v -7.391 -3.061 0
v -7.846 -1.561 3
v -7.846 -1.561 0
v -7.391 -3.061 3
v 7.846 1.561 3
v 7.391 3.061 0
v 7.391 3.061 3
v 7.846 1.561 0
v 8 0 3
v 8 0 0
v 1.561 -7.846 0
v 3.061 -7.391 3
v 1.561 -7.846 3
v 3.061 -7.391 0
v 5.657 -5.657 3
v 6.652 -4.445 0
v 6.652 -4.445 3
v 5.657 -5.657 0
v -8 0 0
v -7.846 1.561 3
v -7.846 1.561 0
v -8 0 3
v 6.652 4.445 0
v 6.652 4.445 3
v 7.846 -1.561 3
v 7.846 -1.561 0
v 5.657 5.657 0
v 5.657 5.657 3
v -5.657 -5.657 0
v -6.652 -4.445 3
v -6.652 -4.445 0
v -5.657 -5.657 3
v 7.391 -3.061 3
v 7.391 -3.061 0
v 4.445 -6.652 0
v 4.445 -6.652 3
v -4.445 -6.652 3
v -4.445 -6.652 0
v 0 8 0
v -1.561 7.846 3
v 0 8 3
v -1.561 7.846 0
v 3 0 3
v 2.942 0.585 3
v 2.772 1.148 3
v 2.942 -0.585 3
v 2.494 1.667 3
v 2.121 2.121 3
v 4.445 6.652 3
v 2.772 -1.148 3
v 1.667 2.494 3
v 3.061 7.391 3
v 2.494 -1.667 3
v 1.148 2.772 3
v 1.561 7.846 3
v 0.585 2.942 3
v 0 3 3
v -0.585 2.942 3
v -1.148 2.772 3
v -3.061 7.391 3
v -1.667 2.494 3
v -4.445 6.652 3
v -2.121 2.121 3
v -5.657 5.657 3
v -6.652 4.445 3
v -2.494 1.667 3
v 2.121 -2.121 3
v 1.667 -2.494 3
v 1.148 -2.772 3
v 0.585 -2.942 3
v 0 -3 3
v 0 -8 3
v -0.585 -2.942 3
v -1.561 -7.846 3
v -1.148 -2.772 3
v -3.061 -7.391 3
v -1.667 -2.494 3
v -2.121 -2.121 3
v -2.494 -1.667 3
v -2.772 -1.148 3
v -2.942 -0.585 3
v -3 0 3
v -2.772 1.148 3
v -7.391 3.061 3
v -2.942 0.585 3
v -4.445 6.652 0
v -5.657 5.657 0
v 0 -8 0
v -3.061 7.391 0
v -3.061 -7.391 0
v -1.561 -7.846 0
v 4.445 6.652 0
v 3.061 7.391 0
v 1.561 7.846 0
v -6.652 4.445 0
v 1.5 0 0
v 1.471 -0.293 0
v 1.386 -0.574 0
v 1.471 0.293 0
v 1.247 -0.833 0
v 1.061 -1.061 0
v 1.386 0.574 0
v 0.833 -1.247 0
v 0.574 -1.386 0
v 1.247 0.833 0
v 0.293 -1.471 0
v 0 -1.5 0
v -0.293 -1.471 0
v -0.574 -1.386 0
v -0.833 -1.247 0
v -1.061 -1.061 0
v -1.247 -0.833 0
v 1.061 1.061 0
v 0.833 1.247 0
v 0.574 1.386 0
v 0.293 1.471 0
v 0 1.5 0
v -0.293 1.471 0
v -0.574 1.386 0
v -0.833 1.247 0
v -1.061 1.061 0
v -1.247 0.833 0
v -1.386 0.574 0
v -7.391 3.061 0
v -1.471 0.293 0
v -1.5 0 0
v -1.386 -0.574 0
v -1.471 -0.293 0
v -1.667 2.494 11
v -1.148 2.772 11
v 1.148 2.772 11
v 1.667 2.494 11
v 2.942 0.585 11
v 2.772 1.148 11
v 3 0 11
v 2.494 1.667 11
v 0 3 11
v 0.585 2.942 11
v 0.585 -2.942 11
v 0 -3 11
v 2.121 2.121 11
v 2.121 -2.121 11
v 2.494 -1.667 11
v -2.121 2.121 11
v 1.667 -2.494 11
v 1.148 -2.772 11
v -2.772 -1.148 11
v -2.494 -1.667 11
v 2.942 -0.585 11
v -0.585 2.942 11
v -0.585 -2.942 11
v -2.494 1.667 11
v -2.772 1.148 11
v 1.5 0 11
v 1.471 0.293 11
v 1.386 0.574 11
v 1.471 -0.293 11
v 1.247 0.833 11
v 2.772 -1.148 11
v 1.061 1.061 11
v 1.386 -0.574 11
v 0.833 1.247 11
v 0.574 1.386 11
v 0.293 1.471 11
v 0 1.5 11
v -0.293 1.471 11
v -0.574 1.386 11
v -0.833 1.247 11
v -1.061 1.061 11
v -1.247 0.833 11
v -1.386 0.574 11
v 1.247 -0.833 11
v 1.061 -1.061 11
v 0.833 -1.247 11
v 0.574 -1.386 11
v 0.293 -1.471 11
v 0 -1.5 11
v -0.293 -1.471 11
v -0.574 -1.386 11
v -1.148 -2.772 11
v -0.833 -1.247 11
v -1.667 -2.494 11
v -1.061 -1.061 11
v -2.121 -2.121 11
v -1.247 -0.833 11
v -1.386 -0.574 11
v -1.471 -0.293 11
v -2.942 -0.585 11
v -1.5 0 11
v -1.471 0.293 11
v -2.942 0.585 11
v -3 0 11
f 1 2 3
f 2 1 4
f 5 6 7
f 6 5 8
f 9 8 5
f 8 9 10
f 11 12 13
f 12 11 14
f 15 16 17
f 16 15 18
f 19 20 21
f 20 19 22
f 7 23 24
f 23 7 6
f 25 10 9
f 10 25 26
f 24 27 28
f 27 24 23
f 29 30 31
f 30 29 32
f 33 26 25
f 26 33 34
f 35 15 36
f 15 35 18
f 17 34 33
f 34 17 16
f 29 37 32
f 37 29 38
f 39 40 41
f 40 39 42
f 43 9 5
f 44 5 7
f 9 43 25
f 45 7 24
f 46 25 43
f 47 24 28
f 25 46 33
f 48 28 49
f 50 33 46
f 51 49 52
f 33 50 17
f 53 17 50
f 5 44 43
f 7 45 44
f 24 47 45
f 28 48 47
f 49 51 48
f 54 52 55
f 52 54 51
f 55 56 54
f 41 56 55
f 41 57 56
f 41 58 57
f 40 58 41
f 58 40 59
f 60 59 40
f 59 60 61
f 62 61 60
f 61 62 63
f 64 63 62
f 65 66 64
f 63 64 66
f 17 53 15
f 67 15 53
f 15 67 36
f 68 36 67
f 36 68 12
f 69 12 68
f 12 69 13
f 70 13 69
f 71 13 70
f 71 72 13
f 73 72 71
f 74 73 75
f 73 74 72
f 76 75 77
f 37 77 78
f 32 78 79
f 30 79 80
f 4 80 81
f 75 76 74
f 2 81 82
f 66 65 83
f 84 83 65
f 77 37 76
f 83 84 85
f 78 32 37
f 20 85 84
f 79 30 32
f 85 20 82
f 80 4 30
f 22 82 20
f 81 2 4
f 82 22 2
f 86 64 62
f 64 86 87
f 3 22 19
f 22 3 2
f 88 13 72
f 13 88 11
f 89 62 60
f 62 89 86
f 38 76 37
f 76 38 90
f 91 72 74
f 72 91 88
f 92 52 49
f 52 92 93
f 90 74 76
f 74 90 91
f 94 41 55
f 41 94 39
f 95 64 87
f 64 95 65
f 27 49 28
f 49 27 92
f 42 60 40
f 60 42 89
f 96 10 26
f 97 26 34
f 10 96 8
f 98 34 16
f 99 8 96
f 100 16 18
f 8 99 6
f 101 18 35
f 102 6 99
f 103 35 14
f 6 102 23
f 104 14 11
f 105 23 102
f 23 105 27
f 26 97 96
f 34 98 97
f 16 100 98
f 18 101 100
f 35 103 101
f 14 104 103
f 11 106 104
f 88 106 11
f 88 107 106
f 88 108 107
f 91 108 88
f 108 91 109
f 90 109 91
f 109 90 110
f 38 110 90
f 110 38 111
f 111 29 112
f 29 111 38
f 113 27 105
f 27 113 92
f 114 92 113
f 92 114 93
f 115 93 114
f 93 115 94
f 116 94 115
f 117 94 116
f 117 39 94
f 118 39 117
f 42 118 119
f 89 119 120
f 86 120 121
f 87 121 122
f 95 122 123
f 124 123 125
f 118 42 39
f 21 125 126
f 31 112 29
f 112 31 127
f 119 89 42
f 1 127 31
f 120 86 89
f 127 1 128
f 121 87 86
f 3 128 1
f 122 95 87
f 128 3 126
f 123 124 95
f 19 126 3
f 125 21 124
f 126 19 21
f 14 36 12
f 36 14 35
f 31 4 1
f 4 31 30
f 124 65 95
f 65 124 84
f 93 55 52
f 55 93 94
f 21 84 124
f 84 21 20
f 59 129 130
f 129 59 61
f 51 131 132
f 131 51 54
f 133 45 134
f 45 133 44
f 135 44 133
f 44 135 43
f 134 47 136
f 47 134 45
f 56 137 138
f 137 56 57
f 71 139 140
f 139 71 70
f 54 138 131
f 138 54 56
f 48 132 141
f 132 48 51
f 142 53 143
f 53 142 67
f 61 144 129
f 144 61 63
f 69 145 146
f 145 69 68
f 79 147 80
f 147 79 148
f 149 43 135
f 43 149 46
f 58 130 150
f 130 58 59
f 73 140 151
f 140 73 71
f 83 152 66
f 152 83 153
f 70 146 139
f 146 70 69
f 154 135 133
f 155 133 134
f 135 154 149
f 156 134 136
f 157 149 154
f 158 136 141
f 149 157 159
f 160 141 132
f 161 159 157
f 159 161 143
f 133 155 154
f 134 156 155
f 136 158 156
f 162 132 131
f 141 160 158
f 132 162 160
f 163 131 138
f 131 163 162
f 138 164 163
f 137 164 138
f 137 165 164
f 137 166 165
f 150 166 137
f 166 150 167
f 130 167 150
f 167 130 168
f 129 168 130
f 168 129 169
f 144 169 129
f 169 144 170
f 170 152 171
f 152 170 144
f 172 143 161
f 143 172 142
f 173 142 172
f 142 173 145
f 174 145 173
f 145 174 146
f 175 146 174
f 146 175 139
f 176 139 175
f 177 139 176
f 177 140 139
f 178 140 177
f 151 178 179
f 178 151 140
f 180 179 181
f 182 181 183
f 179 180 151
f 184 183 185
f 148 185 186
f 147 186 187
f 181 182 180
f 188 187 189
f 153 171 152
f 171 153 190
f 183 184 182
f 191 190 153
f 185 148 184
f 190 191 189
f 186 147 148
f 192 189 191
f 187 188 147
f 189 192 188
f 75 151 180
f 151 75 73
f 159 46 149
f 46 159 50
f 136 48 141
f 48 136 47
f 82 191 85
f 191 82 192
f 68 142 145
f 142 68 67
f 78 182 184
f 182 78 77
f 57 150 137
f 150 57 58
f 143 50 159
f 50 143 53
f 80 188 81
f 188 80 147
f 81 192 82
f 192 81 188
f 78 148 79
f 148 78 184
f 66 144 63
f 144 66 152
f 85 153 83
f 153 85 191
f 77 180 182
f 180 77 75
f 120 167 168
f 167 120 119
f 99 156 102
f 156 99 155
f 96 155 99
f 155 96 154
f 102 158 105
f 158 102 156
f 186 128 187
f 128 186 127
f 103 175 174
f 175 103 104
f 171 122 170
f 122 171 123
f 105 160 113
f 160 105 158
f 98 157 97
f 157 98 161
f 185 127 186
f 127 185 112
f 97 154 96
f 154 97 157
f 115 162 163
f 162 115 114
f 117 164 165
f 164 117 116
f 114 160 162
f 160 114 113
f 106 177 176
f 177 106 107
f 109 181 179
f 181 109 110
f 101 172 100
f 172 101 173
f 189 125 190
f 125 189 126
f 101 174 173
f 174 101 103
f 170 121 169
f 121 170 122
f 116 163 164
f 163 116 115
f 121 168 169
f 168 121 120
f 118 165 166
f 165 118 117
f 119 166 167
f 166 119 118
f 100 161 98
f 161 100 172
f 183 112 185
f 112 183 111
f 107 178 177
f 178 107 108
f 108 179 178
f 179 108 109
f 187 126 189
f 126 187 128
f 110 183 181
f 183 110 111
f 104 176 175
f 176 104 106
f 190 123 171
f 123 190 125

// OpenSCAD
$fn = 32;

// ----------------------------------------------------------------------
// Micro post: flanged post, 5-20 mm class
// ----------------------------------------------------------------------

// --- parameters (mm) ---
post_d = 6;               // post diameter
post_h = 8;               // post height above the flange
flange_d = 16;            // flange diameter
flange_t = 3;             // flange thickness
bore_d = 3;               // through bore

total_h = post_h + flange_t;  // overall height

difference() {
  union() {
    cylinder(h = flange_t, d = flange_d);
    translate([0, 0, flange_t]) cylinder(h = post_h, d = post_d);
  }
  translate([0, 0, -1]) cylinder(h = total_h + 2, d = bore_d);
}
